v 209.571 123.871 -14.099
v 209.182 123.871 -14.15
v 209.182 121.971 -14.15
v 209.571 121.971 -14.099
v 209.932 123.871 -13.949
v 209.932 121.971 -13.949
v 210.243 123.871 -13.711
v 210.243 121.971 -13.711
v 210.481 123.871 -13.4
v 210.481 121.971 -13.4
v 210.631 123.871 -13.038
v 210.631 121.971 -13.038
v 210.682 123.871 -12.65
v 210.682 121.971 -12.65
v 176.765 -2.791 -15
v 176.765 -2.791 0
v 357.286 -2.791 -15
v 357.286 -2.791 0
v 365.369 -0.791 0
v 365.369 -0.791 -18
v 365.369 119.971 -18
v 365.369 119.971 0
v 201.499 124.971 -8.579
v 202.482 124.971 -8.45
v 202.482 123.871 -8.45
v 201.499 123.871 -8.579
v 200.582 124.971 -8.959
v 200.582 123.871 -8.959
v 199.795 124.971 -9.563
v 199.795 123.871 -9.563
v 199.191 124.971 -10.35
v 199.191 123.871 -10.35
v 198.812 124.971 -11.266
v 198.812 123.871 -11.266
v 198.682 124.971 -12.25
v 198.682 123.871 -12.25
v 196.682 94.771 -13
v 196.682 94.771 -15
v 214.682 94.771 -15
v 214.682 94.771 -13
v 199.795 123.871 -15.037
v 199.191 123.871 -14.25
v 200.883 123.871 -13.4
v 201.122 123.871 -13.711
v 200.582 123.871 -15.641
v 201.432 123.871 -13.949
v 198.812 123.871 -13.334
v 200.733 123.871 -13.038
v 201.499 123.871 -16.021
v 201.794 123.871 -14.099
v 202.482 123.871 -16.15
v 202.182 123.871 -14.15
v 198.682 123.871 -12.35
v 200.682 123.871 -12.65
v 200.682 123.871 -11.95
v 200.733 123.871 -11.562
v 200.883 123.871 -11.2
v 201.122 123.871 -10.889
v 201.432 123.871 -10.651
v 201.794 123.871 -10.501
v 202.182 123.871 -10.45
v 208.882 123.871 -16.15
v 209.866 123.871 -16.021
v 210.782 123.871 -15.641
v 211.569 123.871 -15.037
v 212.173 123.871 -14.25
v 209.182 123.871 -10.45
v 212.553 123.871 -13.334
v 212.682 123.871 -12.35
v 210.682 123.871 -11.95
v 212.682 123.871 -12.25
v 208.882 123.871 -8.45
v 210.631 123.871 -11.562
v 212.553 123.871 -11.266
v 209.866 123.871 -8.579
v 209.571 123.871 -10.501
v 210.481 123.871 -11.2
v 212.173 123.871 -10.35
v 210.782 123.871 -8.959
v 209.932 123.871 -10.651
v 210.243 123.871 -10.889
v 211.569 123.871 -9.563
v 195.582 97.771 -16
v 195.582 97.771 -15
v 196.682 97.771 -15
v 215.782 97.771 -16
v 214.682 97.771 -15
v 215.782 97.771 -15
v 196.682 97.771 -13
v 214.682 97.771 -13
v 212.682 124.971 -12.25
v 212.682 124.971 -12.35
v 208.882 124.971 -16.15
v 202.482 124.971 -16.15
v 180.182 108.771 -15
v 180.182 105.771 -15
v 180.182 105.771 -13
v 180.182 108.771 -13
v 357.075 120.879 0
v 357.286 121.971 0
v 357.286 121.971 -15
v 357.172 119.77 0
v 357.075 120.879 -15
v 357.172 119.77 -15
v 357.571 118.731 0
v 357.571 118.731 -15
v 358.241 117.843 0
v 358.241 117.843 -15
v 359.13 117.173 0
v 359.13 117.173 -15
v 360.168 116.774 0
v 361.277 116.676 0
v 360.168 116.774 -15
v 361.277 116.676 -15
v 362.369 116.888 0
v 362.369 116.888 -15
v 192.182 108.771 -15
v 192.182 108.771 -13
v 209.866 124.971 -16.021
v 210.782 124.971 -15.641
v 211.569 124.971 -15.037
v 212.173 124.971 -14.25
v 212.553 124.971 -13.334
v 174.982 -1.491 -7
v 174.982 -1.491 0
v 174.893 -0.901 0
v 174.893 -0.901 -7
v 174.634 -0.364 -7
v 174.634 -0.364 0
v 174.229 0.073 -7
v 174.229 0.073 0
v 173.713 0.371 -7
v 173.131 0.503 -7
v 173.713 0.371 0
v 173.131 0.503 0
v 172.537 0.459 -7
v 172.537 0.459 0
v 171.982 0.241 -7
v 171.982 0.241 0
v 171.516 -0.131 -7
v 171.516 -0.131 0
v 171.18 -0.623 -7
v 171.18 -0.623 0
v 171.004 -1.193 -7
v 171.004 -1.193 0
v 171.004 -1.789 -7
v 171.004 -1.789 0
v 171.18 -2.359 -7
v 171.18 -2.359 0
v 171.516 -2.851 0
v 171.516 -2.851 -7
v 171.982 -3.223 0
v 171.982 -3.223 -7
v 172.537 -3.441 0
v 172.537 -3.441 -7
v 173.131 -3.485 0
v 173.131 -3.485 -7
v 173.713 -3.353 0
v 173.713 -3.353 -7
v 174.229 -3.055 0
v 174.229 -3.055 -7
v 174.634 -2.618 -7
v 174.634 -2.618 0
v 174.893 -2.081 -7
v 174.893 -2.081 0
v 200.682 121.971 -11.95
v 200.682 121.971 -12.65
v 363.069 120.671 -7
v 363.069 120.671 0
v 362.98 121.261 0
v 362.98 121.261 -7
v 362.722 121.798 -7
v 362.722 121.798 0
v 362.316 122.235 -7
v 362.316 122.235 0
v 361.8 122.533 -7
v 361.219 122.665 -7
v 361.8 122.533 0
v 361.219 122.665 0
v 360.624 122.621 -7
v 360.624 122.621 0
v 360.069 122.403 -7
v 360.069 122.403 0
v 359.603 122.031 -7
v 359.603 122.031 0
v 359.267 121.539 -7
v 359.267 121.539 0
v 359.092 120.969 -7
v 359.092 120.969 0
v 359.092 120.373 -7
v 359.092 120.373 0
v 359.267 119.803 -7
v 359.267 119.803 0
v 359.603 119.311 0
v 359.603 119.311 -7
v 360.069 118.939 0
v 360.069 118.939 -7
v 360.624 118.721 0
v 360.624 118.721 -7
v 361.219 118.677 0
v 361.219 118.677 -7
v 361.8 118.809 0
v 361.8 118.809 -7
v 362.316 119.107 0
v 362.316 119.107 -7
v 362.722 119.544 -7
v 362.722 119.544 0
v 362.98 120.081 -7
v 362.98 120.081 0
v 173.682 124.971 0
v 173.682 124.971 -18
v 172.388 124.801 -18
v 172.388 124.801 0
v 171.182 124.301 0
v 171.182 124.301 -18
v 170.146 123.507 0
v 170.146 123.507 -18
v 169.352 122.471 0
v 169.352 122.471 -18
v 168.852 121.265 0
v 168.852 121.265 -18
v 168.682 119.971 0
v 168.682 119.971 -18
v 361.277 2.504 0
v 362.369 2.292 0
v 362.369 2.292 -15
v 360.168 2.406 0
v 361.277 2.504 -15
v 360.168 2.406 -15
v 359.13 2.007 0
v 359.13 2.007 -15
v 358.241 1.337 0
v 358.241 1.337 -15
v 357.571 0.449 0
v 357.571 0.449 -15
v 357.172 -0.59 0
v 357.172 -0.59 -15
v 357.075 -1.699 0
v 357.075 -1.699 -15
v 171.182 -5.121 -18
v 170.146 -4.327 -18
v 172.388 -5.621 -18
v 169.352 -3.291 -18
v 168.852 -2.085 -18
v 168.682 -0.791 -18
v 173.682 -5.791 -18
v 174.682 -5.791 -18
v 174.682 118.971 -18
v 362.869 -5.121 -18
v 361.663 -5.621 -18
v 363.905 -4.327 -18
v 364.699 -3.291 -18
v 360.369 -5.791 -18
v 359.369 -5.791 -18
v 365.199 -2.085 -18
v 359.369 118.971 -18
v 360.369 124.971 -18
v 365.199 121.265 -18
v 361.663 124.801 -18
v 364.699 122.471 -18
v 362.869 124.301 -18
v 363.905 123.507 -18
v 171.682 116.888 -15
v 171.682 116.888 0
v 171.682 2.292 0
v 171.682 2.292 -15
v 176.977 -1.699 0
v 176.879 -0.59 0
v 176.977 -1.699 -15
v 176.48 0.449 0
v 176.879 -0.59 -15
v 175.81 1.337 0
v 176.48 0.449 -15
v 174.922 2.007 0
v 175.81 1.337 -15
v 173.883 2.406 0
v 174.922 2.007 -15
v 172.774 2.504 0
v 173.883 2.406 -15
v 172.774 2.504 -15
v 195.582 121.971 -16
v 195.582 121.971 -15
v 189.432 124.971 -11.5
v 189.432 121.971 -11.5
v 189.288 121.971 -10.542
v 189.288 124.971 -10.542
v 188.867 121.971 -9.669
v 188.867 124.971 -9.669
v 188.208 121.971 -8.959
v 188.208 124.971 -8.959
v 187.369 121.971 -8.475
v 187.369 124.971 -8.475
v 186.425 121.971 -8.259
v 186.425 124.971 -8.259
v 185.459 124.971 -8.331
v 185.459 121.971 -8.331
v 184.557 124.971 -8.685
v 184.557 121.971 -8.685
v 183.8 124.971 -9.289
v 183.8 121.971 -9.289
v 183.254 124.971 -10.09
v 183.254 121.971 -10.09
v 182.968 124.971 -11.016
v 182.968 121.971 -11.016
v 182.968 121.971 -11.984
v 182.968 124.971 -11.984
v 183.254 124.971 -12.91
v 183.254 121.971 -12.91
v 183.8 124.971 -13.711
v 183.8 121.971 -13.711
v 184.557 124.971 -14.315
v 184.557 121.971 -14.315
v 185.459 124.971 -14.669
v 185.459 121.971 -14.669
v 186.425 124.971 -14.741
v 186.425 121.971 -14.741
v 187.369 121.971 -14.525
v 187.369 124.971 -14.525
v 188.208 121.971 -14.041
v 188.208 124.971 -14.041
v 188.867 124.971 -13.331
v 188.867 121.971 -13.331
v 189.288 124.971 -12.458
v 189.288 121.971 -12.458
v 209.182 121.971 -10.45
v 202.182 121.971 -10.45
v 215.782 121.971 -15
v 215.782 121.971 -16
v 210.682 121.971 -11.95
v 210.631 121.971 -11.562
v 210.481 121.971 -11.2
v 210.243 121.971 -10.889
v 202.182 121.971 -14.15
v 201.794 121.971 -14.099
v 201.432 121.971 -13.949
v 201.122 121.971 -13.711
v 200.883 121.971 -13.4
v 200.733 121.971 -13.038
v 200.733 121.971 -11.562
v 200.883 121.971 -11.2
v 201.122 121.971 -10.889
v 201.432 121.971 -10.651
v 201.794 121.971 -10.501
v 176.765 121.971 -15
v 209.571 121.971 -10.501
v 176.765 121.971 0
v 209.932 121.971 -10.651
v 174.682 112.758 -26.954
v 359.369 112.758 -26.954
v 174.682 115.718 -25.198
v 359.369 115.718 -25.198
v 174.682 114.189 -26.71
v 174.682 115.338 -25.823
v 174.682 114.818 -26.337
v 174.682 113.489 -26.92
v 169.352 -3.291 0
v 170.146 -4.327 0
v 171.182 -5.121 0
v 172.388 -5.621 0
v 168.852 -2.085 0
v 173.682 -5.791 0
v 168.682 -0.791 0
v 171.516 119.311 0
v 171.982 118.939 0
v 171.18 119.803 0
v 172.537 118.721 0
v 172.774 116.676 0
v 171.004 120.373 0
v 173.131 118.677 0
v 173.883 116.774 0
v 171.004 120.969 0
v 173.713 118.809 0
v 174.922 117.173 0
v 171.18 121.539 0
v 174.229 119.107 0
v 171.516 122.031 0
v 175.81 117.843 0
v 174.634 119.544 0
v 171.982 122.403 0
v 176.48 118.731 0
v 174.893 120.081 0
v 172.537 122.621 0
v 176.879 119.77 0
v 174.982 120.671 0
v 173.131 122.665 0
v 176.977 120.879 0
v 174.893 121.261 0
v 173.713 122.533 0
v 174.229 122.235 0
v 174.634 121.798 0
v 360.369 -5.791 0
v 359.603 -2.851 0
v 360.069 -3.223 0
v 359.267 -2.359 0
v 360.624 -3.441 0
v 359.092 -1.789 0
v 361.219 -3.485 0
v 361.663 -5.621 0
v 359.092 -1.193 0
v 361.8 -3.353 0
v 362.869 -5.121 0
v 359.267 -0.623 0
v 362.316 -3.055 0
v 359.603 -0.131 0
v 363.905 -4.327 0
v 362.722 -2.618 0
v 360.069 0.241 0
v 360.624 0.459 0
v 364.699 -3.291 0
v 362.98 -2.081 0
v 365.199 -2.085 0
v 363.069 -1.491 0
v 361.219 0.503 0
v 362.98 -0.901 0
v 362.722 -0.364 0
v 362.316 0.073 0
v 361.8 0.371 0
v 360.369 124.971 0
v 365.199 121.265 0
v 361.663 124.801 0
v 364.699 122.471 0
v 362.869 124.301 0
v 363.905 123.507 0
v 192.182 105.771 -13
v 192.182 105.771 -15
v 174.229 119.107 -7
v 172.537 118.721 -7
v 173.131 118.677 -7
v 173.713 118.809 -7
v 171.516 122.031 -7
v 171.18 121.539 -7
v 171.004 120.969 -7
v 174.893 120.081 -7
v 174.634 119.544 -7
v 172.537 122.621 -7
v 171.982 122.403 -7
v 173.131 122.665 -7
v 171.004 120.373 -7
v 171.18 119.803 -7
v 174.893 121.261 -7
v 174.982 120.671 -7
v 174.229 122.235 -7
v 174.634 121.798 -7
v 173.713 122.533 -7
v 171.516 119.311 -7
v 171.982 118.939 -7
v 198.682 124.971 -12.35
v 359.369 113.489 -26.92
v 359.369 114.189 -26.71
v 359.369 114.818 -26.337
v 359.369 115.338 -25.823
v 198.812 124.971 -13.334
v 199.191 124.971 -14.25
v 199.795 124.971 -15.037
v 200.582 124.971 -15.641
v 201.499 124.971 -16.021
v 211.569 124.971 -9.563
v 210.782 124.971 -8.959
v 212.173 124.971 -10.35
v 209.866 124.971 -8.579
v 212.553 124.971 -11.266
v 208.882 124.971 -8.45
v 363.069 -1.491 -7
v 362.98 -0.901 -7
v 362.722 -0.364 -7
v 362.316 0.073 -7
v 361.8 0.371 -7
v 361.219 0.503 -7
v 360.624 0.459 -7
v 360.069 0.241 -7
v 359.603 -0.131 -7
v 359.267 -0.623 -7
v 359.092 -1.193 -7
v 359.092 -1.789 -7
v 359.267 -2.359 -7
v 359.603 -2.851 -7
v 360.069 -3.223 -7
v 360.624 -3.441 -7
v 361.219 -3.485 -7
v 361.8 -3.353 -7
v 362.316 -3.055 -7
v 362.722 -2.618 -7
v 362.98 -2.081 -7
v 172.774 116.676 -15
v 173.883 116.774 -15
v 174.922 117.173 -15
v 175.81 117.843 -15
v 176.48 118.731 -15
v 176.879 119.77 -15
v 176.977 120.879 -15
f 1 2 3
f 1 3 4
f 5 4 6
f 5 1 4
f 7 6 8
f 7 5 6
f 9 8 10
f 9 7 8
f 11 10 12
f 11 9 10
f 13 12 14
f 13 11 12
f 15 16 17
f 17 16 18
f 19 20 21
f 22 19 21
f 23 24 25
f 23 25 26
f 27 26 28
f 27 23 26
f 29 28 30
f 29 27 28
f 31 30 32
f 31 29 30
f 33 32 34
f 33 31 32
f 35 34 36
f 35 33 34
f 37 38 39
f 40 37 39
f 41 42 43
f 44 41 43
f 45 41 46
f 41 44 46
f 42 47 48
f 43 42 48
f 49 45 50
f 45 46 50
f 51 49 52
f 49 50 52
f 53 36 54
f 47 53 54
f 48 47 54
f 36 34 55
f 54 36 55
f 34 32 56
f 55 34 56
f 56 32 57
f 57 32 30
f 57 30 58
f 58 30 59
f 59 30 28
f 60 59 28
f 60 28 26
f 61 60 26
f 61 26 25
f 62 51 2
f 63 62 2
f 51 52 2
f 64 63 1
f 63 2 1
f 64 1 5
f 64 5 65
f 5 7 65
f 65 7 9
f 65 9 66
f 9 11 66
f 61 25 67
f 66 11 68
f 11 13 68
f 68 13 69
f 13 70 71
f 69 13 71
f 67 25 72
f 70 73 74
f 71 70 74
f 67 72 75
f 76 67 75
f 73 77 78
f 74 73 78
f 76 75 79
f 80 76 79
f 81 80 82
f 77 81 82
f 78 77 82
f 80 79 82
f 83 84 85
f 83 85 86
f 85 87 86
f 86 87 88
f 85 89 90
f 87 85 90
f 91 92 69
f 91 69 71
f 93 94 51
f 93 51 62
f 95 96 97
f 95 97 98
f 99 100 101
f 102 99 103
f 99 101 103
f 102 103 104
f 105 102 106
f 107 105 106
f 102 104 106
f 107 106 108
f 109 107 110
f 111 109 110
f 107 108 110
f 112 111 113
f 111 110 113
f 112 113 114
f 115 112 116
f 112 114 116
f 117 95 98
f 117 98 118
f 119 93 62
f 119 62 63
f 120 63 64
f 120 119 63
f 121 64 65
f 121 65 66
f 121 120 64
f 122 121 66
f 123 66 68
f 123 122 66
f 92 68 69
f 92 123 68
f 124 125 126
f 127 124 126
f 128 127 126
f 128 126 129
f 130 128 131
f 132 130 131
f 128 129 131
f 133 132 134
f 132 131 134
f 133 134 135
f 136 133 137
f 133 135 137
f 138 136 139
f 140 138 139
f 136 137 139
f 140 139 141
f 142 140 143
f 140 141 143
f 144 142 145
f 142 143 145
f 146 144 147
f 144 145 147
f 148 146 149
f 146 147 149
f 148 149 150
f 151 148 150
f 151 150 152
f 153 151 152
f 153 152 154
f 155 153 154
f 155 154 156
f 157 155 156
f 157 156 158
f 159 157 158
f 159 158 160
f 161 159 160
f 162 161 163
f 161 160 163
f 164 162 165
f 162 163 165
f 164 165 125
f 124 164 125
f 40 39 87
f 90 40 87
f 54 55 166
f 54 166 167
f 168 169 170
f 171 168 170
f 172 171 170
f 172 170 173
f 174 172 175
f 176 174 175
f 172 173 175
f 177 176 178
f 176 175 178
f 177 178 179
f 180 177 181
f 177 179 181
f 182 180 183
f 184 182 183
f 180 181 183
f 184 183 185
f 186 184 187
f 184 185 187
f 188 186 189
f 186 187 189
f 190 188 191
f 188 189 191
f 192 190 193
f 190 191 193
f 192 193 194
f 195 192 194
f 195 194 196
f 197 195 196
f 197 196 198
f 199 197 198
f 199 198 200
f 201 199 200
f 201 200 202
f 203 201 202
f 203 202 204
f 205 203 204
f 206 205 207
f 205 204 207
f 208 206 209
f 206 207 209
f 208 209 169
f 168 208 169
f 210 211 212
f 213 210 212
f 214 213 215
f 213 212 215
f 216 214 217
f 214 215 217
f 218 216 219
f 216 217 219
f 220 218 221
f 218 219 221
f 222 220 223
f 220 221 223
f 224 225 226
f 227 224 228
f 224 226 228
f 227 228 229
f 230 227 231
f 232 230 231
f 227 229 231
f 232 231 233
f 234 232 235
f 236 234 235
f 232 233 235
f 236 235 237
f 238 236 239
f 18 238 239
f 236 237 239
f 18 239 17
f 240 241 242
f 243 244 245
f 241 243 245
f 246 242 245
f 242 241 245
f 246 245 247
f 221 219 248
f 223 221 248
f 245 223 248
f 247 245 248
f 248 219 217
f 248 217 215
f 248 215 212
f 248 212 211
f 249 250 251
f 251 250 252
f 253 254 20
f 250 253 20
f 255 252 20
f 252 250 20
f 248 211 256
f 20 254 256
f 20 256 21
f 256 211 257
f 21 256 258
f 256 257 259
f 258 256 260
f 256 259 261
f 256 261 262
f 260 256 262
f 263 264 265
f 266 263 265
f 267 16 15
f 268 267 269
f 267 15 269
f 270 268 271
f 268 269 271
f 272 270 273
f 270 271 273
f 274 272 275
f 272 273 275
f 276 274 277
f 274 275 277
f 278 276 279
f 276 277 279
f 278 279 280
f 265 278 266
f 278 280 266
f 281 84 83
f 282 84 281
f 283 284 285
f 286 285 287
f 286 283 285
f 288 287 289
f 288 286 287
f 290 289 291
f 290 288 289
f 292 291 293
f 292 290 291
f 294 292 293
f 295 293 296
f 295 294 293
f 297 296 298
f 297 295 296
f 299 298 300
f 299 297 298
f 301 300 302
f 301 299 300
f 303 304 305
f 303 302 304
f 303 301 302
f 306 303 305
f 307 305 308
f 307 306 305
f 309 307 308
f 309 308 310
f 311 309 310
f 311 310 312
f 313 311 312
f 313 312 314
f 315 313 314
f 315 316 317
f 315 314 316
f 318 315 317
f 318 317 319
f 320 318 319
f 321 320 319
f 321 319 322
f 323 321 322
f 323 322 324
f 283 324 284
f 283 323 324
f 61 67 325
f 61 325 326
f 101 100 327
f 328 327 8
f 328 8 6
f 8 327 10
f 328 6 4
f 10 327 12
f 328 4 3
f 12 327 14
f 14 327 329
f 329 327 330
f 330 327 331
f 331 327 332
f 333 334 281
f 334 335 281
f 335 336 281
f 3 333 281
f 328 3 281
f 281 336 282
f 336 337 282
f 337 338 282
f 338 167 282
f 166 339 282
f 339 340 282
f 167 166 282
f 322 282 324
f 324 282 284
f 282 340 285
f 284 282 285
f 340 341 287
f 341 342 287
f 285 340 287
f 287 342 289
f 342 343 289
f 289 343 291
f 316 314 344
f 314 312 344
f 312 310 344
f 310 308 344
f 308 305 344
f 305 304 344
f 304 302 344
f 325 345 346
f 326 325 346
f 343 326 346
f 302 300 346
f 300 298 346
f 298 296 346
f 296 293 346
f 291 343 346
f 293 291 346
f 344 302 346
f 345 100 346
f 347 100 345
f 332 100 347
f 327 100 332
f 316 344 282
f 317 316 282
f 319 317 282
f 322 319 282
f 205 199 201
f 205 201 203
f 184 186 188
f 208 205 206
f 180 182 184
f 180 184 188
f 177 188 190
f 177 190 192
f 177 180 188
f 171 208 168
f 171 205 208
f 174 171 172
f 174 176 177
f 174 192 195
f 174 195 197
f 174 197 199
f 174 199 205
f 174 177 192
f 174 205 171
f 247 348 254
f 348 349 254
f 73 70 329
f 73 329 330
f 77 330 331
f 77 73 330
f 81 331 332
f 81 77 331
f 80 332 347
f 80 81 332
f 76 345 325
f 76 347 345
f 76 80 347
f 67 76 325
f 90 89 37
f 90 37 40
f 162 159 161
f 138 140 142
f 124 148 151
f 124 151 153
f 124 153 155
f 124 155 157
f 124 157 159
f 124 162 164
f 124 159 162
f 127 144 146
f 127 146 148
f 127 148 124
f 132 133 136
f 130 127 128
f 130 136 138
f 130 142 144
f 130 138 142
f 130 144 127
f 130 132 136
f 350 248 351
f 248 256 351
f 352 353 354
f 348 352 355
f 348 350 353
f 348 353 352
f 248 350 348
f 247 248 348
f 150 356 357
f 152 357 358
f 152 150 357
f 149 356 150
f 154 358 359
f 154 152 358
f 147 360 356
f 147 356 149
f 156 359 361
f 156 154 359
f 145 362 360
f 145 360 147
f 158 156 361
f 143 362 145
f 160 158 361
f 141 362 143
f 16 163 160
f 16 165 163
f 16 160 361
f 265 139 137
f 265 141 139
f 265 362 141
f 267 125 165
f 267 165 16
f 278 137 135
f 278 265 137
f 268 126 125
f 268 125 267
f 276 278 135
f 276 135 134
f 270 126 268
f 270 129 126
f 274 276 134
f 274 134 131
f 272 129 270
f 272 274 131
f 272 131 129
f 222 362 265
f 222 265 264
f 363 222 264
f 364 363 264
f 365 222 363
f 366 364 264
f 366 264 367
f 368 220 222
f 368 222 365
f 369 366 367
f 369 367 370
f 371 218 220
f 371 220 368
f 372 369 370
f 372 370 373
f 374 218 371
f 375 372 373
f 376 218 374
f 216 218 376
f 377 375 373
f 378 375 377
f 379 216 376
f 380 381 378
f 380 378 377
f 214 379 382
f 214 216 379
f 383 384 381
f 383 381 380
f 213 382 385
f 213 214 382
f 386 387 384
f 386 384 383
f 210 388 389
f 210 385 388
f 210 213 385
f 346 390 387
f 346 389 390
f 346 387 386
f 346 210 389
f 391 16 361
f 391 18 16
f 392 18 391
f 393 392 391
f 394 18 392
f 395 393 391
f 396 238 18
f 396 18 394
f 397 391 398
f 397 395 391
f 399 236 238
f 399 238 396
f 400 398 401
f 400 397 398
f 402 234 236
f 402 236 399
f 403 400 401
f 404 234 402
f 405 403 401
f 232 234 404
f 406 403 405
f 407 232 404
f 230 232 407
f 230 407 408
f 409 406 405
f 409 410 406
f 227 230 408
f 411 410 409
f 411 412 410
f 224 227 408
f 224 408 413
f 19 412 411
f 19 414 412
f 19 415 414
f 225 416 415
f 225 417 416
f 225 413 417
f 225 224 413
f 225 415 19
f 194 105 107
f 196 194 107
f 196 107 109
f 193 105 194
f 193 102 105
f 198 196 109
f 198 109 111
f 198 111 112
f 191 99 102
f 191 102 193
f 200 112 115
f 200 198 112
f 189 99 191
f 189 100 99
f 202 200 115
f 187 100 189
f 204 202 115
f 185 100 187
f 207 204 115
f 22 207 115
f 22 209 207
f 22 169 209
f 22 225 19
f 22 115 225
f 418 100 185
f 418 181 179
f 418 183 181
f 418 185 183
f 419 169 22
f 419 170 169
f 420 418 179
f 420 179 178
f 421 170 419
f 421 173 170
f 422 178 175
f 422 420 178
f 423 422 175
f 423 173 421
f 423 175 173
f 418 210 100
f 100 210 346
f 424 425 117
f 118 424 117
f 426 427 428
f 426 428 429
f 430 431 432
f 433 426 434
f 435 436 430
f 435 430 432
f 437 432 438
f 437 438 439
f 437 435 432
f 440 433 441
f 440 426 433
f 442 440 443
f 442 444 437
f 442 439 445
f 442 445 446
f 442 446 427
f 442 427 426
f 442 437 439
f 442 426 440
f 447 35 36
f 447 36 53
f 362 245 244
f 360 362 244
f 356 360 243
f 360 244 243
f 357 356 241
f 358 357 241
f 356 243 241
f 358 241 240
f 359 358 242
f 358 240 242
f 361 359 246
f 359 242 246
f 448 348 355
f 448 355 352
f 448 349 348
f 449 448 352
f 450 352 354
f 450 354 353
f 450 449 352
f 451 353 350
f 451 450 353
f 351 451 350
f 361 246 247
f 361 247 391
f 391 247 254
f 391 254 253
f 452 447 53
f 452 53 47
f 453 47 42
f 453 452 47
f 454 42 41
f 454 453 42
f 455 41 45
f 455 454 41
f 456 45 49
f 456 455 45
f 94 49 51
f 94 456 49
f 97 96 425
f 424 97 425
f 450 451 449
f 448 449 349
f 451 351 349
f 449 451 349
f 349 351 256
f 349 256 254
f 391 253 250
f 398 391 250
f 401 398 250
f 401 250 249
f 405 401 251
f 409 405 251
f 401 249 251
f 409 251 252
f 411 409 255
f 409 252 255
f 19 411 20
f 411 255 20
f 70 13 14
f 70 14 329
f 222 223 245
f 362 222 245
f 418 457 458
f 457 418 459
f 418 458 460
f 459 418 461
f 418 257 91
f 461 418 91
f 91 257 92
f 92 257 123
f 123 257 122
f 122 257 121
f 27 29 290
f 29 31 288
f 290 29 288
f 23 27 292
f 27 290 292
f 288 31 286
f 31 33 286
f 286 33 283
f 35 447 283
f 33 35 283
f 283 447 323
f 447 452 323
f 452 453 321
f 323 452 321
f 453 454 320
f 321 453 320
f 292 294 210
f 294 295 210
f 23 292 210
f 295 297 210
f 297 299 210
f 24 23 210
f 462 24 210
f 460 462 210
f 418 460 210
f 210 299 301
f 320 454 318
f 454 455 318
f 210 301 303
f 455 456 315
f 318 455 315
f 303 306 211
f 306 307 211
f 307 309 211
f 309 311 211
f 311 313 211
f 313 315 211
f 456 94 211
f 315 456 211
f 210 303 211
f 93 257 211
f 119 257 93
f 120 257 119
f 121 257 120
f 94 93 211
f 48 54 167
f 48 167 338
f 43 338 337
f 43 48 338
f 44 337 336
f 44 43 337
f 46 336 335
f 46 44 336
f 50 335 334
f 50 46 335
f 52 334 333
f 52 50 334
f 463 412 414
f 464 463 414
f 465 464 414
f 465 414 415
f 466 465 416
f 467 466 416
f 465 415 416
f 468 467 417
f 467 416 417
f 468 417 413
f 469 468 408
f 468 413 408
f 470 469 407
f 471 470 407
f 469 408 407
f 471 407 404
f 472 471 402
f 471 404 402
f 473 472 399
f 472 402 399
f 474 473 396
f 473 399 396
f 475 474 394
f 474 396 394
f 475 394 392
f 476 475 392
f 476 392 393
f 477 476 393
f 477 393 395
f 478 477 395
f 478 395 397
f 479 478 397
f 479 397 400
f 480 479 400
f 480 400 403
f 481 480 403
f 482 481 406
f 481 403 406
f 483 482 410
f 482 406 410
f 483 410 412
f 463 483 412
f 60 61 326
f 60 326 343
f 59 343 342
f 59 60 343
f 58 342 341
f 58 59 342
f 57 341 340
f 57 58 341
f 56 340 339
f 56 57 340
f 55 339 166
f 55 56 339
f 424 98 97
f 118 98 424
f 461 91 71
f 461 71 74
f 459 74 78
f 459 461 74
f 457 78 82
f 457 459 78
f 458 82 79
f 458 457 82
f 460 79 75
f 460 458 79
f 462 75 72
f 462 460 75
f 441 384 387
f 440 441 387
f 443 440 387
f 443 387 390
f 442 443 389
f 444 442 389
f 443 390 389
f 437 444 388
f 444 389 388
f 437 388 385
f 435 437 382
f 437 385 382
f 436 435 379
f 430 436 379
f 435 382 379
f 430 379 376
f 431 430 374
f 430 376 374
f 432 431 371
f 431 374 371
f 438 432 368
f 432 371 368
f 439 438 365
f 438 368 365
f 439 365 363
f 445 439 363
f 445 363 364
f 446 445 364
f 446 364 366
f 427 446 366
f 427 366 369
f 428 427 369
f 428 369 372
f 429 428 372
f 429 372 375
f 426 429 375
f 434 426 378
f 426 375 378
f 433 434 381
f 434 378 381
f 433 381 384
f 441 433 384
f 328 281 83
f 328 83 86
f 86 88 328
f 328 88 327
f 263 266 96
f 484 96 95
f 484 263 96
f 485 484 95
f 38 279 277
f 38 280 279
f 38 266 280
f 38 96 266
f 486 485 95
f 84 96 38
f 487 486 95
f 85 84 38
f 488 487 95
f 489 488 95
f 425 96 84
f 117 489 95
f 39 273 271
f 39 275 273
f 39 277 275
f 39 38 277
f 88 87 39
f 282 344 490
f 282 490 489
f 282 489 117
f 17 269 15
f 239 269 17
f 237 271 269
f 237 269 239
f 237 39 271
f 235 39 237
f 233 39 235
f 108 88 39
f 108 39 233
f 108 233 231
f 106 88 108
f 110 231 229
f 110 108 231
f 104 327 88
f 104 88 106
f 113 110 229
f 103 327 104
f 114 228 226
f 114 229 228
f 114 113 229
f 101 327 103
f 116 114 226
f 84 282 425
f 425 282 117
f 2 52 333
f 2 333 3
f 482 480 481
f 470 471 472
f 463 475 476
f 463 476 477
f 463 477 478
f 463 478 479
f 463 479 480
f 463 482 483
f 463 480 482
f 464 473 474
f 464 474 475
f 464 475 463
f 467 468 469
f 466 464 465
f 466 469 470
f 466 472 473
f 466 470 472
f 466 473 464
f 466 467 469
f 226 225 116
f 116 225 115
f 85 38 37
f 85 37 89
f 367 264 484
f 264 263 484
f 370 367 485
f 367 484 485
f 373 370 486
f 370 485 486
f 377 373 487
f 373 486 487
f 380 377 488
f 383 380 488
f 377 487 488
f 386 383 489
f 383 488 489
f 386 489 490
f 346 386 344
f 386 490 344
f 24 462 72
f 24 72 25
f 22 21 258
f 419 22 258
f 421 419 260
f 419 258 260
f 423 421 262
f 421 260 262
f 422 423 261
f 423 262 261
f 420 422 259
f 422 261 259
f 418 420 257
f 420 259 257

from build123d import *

# Parameters (mm, degrees)
RIGHT_BODY_PAD_DEPTH            = 18
RIGHT_BODY_CAVITY_POCKET_DEPTH  = 15
RIGHT_BODY_BOSSES_R             = 4
RIGHT_BODY_BOSS_PAD_DEPTH       = 15
RIGHT_BODY_INSERT_HOLES_R       = 2
RIGHT_BODY_INSERT_POCKETS_DEPTH = 7
RIGHT_BODY_REST_PAD_DEPTH       = 92.343675
RIGHT_BODY_REST_FILLET_R        = 3
RIGHT_JACK_HOLE_R               = 3.25
RIGHT_JACK_HOLE_POCKET_DEPTH    = 3.2
RIGHT_JACK_STOP_W               = 12
RIGHT_JACK_STOP_H               = 3
RIGHT_JACK_STOP_PAD_DEPTH       = 2
RIGHT_CTRL_SEAT_W               = 20.2
RIGHT_CTRL_SEAT_H               = 24.2
RIGHT_CTRL_SEAT_POCKET_DEPTH    = 1
RIGHT_USB_OPENING_POCKET_DEPTH  = 3.2
RIGHT_USB_BEZEL_POCKET_DEPTH    = 1.1
RIGHT_CTRL_STOP_W               = 18
RIGHT_CTRL_STOP_H               = 3
RIGHT_CTRL_STOP_PAD_DEPTH       = 2


with BuildPart() as part:
    # Right_Body_Outline → Right_Body_Pad (new body)
    with BuildSketch(Plane.XY.offset(-18)):
        with BuildLine():
            Line((-0.38035, -5.791), (186.307, -5.791))
            ThreePointArc((186.307, -5.791), (189.842534, -4.326534), (191.307, -0.791))
            Line((191.307, -0.791), (191.307, 119.971))
            ThreePointArc((191.307, 119.971), (189.842534, 123.506534), (186.307, 124.971))
            Line((186.307, 124.971), (-0.38035, 124.971))
            ThreePointArc((-0.38035, 124.971), (-3.915884, 123.506534), (-5.38035, 119.971))
            Line((-5.38035, 119.971), (-5.38035, -0.791))
            ThreePointArc((-5.38035, -0.791), (-3.915884, -4.326534), (-0.38035, -5.791))
        make_face()
    extrude(amount=RIGHT_BODY_PAD_DEPTH)

    # Right_Body_Cavity → Right_Body_Cavity_Pocket (cut)
    with BuildSketch(Plane.XY):
        with BuildLine():
            Line((-0.38035, -2.791), (186.307, -2.791))
            ThreePointArc((186.307, -2.791), (187.721214, -2.205214), (188.307, -0.791))
            Line((188.307, -0.791), (188.307, 119.971))
            ThreePointArc((188.307, 119.971), (187.721214, 121.385214), (186.307, 121.971))
            Line((186.307, 121.971), (-0.38035, 121.971))
            ThreePointArc((-0.38035, 121.971), (-1.794564, 121.385214), (-2.38035, 119.971))
            Line((-2.38035, 119.971), (-2.38035, -0.791))
            ThreePointArc((-2.38035, -0.791), (-1.794564, -2.205214), (-0.38035, -2.791))
        make_face()
    extrude(amount=-RIGHT_BODY_CAVITY_POCKET_DEPTH, mode=Mode.SUBTRACT)

    # Right_Body_Bosses → Right_Body_Boss_Pad (join)
    with BuildSketch(Plane.XY.offset(-15)):
        with Locations((-1.08035, -1.491)):
            Circle(RIGHT_BODY_BOSSES_R)
        with Locations((187.007, -1.491)):
            Circle(RIGHT_BODY_BOSSES_R)
        with Locations((-1.08035, 120.671)):
            Circle(RIGHT_BODY_BOSSES_R)
        with Locations((187.007, 120.671)):
            Circle(RIGHT_BODY_BOSSES_R)
    extrude(amount=RIGHT_BODY_BOSS_PAD_DEPTH)

    # Right_Body_Insert_Holes → Right_Body_Insert_Pockets (cut)
    with BuildSketch(Plane.XY):
        with Locations((-1.08035, -1.491)):
            Circle(RIGHT_BODY_INSERT_HOLES_R)
        with Locations((187.007, -1.491)):
            Circle(RIGHT_BODY_INSERT_HOLES_R)
        with Locations((-1.08035, 120.671)):
            Circle(RIGHT_BODY_INSERT_HOLES_R)
        with Locations((187.007, 120.671)):
            Circle(RIGHT_BODY_INSERT_HOLES_R)
    extrude(amount=-RIGHT_BODY_INSERT_POCKETS_DEPTH, mode=Mode.SUBTRACT)

    # Right_Body_Rest → Right_Body_Rest_Pad (join, symmetric)
    with BuildSketch(Plane.YZ.offset(92.963325)):
        Polygon((-5.791, -18), (118.971, -18), (114.852748, -27.112629), align=None)
    extrude(amount=RIGHT_BODY_REST_PAD_DEPTH, both=True)

    # Right_Body_Rest_Fillet
    right_body_rest_fillet_edges = [part.edges().sort_by_distance(p)[0] for p in [
        (92.963325, 114.852748, -27.112629),
    ]]
    fillet(right_body_rest_fillet_edges, radius=RIGHT_BODY_REST_FILLET_R)

    # Right_Jack_Hole → Right_Jack_Hole_Pocket (cut)
    with BuildSketch(Plane.XZ.offset(-124.971)):
        with Locations((12.11965, -11.5)):
            Circle(RIGHT_JACK_HOLE_R)
    extrude(amount=RIGHT_JACK_HOLE_POCKET_DEPTH, mode=Mode.SUBTRACT)

    # Right_Jack_Stop → Right_Jack_Stop_Pad (join)
    with BuildSketch(Plane.XY.offset(-15)):
        with Locations((12.11965, 107.271)):
            Rectangle(RIGHT_JACK_STOP_W, RIGHT_JACK_STOP_H)
    extrude(amount=RIGHT_JACK_STOP_PAD_DEPTH)

    # Right_Ctrl_Seat → Right_Ctrl_Seat_Pocket (cut)
    with BuildSketch(Plane.XY.offset(-15)):
        with Locations((31.62, 109.871)):
            Rectangle(RIGHT_CTRL_SEAT_W, RIGHT_CTRL_SEAT_H)
    extrude(amount=-RIGHT_CTRL_SEAT_POCKET_DEPTH, mode=Mode.SUBTRACT)

    # Right_Usb_Opening → Right_Usb_Opening_Pocket (cut)
    with BuildSketch(Plane.XZ.offset(-124.971)):
        with BuildLine():
            Line((28.12, -14.15), (35.12, -14.15))
            ThreePointArc((35.12, -14.15), (36.18066, -13.71066), (36.62, -12.65))
            Line((36.62, -12.65), (36.62, -11.95))
            ThreePointArc((36.62, -11.95), (36.18066, -10.88934), (35.12, -10.45))
            Line((35.12, -10.45), (28.12, -10.45))
            ThreePointArc((28.12, -10.45), (27.05934, -10.88934), (26.62, -11.95))
            Line((26.62, -11.95), (26.62, -12.65))
            ThreePointArc((26.62, -12.65), (27.05934, -13.71066), (28.12, -14.15))
        make_face()
    extrude(amount=RIGHT_USB_OPENING_POCKET_DEPTH, mode=Mode.SUBTRACT)

    # Right_Usb_Bezel → Right_Usb_Bezel_Pocket (cut)
    with BuildSketch(Plane.XZ.offset(-124.971)):
        with BuildLine():
            Line((28.42, -16.15), (34.82, -16.15))
            ThreePointArc((34.82, -16.15), (37.507006, -15.037006), (38.62, -12.35))
            Line((38.62, -12.35), (38.62, -12.25))
            ThreePointArc((38.62, -12.25), (37.507006, -9.562994), (34.82, -8.45))
            Line((34.82, -8.45), (28.42, -8.45))
            ThreePointArc((28.42, -8.45), (25.732994, -9.562994), (24.62, -12.25))
            Line((24.62, -12.25), (24.62, -12.35))
            ThreePointArc((24.62, -12.35), (25.732994, -15.037006), (28.42, -16.15))
        make_face()
    extrude(amount=RIGHT_USB_BEZEL_POCKET_DEPTH, mode=Mode.SUBTRACT)

    # Right_Ctrl_Stop → Right_Ctrl_Stop_Pad (join)
    with BuildSketch(Plane.XY.offset(-15)):
        with Locations((31.62, 96.271)):
            Rectangle(RIGHT_CTRL_STOP_W, RIGHT_CTRL_STOP_H)
    extrude(amount=RIGHT_CTRL_STOP_PAD_DEPTH)


with BuildPart() as part_1:
    # Right_Keyboard_Body placement: moved
    add(part.part.moved(Location((174.06235, 0, 0))))


solid = part_1.part
